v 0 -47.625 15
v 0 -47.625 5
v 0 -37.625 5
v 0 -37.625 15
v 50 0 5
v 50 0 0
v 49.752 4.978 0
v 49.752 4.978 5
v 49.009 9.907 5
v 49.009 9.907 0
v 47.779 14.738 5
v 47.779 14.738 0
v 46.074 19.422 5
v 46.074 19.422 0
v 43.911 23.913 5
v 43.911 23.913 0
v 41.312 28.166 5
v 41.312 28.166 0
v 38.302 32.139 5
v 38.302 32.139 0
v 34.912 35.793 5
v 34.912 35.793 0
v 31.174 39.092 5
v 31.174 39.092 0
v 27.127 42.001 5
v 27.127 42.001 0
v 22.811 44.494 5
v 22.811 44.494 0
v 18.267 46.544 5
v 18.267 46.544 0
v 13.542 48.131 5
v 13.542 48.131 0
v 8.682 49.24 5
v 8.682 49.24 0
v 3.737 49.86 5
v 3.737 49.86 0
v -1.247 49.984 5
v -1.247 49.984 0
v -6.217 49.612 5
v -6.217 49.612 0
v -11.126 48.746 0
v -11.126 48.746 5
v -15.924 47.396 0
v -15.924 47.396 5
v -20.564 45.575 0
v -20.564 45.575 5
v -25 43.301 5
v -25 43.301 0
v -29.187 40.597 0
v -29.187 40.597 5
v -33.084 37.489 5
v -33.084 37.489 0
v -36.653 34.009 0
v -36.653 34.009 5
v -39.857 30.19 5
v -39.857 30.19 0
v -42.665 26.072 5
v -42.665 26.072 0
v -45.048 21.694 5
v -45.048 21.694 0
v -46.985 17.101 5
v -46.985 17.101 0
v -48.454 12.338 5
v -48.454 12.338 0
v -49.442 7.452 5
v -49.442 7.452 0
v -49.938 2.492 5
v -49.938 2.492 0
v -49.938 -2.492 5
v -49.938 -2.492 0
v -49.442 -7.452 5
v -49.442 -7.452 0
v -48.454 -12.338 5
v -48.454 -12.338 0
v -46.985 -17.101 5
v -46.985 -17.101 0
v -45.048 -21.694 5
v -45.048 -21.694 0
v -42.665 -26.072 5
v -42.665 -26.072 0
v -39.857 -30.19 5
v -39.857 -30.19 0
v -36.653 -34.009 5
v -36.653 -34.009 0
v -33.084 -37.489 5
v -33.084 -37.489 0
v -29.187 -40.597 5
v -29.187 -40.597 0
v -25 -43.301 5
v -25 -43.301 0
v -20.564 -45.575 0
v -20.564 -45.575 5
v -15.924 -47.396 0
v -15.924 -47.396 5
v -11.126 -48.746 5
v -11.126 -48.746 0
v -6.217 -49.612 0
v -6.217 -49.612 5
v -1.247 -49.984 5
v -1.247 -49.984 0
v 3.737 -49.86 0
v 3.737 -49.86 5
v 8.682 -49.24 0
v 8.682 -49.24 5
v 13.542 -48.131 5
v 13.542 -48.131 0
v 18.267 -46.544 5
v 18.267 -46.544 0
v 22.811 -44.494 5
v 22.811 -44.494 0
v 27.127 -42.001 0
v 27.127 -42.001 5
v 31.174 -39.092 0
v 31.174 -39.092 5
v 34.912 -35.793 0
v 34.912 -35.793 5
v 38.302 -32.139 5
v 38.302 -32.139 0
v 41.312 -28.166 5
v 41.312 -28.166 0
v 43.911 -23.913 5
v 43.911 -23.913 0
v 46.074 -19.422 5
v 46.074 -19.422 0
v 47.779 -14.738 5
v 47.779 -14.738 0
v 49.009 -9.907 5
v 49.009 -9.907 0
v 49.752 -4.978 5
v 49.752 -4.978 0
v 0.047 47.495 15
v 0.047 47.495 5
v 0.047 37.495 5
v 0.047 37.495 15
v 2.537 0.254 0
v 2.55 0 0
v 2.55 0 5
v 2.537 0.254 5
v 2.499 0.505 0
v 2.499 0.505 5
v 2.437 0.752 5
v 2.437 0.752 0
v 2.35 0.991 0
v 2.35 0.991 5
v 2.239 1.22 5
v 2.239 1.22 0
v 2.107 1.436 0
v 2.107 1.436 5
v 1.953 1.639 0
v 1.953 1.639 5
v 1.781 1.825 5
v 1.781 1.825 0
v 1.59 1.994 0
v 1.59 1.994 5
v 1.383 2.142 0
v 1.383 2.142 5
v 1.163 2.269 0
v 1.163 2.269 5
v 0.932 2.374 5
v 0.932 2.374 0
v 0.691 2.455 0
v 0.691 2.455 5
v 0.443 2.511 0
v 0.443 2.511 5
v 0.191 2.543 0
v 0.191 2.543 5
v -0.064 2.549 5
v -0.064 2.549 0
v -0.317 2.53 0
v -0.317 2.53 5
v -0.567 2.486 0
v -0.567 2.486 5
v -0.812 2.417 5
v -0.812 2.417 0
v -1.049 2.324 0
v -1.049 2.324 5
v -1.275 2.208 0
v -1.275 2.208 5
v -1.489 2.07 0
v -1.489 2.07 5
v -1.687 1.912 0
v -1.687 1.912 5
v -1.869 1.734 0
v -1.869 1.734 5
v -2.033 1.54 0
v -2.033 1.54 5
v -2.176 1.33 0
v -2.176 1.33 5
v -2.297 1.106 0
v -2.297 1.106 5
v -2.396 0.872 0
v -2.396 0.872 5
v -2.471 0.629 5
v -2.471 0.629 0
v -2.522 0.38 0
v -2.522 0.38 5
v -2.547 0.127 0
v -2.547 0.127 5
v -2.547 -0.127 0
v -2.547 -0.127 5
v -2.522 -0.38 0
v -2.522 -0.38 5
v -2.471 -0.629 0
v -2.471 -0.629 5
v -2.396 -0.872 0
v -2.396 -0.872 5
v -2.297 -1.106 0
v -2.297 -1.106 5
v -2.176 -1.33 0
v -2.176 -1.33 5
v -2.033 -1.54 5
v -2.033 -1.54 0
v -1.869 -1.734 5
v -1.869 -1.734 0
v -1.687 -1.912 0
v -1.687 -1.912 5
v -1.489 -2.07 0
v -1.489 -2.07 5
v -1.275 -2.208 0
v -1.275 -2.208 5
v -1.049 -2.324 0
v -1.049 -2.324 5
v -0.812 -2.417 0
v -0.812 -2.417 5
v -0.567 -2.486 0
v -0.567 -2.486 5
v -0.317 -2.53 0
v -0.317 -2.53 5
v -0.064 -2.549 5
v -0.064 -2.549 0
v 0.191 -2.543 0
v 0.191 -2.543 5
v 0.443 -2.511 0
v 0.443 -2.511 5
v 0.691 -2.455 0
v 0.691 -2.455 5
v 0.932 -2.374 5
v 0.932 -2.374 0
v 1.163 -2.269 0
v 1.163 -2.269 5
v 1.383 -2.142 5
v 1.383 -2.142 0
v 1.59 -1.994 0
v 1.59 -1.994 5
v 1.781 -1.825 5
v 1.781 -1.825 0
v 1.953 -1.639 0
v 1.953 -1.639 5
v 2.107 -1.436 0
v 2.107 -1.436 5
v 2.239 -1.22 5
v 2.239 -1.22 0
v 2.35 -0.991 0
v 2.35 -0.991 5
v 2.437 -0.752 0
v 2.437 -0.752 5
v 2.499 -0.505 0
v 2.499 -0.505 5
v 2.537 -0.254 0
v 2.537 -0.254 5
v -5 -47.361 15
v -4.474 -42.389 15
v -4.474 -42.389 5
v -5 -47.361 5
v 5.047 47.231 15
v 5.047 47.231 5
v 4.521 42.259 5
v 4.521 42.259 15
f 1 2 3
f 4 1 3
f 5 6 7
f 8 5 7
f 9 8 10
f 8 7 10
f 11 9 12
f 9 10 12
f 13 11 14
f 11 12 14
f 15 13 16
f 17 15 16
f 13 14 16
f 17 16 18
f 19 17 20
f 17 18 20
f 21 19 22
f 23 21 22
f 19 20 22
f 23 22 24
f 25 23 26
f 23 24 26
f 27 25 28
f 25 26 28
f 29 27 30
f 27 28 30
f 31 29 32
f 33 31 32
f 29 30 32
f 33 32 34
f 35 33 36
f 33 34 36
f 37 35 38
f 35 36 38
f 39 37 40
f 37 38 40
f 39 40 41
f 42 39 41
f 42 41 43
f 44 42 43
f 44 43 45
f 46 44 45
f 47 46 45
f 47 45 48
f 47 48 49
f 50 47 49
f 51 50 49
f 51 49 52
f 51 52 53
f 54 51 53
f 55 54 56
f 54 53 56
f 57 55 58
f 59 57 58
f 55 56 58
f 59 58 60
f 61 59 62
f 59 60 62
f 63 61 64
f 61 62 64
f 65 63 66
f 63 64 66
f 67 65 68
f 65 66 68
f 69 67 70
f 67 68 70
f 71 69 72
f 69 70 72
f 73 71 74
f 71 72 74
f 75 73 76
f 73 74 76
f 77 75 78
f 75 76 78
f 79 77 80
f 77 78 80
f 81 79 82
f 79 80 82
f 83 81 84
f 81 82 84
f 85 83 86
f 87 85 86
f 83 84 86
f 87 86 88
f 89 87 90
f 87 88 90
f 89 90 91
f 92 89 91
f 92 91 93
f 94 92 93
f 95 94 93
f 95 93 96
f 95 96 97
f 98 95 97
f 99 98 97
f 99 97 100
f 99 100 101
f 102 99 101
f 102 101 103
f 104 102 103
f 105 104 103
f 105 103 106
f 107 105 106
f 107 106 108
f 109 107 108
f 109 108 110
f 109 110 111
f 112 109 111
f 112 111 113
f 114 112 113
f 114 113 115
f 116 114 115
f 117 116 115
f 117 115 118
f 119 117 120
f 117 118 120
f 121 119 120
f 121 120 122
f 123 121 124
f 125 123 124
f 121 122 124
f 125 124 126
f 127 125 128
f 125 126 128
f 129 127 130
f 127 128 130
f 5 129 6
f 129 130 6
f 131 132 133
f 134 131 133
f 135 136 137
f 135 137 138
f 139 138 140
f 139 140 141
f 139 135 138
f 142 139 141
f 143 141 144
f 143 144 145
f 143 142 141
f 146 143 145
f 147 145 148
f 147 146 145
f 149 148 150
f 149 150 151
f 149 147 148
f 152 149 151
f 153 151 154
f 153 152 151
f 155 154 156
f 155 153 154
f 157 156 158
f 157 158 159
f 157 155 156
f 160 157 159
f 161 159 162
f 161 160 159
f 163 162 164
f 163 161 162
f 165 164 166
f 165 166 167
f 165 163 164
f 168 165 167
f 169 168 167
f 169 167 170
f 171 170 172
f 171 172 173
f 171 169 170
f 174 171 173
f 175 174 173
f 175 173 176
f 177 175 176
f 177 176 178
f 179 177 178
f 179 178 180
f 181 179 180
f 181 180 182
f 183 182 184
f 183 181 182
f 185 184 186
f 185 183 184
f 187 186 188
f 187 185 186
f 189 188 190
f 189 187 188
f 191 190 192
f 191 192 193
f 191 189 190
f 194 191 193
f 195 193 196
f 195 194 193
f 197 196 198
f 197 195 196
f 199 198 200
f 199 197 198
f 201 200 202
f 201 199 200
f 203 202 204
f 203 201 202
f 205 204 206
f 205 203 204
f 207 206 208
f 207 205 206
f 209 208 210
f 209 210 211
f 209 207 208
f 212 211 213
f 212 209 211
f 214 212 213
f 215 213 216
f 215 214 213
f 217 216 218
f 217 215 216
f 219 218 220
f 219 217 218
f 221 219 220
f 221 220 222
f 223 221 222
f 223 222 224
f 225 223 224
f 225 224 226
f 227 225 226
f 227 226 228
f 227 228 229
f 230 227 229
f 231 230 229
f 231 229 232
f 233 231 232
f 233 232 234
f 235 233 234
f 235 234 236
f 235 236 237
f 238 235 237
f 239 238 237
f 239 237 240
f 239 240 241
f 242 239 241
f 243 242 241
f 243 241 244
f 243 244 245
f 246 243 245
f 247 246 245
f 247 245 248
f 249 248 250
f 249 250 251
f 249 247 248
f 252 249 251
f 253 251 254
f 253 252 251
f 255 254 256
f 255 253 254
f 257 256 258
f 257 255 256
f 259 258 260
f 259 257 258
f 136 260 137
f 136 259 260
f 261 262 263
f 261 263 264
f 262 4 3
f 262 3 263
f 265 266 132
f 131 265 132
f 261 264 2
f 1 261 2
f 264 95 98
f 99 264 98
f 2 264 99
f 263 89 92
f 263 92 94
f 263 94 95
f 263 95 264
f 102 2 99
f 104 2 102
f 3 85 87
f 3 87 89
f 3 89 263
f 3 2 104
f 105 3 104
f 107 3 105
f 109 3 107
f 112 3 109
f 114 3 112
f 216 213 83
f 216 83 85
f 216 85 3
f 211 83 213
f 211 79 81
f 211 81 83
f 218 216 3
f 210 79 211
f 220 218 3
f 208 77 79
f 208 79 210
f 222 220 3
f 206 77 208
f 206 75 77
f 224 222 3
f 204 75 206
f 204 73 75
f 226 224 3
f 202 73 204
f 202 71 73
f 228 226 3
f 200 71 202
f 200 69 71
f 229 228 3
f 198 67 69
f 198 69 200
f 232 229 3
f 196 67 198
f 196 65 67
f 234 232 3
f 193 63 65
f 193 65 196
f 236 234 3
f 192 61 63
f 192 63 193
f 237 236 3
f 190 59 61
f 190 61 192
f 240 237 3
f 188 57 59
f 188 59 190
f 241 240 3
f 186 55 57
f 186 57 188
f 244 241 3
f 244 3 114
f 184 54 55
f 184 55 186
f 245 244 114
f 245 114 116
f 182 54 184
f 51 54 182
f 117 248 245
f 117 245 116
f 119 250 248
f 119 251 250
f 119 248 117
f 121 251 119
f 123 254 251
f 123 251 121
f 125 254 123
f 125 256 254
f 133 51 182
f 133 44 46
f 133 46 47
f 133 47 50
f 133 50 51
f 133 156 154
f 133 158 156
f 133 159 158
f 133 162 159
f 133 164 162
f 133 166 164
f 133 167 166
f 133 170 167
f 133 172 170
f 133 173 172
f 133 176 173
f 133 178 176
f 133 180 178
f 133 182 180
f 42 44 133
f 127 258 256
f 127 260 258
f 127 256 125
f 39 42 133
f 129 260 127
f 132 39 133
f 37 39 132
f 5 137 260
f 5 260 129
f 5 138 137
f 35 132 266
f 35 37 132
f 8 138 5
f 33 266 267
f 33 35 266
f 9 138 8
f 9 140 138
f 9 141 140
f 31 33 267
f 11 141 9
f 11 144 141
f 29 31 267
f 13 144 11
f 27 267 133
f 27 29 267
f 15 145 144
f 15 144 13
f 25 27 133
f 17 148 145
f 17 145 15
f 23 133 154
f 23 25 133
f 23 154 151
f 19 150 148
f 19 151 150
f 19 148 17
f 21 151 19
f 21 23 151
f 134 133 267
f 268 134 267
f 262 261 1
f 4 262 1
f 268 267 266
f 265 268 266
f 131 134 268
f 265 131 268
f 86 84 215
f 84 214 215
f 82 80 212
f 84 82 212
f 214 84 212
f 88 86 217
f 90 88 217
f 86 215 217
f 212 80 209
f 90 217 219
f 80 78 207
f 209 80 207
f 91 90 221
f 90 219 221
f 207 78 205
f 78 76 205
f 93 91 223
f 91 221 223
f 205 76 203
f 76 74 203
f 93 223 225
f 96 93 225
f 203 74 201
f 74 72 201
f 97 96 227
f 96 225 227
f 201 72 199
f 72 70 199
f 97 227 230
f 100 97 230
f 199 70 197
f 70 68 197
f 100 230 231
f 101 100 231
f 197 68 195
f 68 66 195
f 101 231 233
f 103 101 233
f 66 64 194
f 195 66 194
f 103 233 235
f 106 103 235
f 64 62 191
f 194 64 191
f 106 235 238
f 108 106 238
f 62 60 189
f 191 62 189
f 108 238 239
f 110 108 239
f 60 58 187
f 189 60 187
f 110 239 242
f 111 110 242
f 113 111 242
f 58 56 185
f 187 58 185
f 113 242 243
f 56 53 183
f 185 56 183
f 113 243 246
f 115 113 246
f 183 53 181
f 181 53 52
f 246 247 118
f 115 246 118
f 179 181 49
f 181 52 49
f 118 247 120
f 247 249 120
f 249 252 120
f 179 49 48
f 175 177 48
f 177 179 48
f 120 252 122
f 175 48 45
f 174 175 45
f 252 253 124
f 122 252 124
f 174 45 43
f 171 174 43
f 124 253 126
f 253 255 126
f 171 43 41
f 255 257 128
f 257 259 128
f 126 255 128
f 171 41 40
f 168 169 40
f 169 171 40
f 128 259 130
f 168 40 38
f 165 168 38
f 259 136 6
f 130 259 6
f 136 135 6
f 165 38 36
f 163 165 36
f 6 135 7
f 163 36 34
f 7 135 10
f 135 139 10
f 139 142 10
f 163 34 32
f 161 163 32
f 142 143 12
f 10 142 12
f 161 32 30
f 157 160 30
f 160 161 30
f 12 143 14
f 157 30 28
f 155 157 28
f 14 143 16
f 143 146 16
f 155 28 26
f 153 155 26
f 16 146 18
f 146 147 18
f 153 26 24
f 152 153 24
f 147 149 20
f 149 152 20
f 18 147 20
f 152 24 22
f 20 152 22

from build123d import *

# Parameters (mm, degrees)
F0_R     = 50
F0_R_2   = 2.55
F1_DEPTH = 5
F3_DEPTH = 10


with BuildPart() as f1:
    # F0 (on Top) → F1 (new body)
    with BuildSketch(Plane.XY):
        Circle(F0_R)
        Circle(F0_R_2, mode=Mode.SUBTRACT)
    extrude(amount=F1_DEPTH)

    # F2 (on face) → F3 (join)
    with BuildSketch(Plane.XY.offset(5)):
        Polygon((5.046888, 47.231122), (0.046888, 47.495013), (0.046888, 37.495013), (4.520572, 42.2589), align=None)
        Polygon((-5, -47.361098), (0, -47.624989), (0, -37.624989), (-4.473684, -42.388876), align=None)
    extrude(amount=F3_DEPTH)


solid = f1.part
